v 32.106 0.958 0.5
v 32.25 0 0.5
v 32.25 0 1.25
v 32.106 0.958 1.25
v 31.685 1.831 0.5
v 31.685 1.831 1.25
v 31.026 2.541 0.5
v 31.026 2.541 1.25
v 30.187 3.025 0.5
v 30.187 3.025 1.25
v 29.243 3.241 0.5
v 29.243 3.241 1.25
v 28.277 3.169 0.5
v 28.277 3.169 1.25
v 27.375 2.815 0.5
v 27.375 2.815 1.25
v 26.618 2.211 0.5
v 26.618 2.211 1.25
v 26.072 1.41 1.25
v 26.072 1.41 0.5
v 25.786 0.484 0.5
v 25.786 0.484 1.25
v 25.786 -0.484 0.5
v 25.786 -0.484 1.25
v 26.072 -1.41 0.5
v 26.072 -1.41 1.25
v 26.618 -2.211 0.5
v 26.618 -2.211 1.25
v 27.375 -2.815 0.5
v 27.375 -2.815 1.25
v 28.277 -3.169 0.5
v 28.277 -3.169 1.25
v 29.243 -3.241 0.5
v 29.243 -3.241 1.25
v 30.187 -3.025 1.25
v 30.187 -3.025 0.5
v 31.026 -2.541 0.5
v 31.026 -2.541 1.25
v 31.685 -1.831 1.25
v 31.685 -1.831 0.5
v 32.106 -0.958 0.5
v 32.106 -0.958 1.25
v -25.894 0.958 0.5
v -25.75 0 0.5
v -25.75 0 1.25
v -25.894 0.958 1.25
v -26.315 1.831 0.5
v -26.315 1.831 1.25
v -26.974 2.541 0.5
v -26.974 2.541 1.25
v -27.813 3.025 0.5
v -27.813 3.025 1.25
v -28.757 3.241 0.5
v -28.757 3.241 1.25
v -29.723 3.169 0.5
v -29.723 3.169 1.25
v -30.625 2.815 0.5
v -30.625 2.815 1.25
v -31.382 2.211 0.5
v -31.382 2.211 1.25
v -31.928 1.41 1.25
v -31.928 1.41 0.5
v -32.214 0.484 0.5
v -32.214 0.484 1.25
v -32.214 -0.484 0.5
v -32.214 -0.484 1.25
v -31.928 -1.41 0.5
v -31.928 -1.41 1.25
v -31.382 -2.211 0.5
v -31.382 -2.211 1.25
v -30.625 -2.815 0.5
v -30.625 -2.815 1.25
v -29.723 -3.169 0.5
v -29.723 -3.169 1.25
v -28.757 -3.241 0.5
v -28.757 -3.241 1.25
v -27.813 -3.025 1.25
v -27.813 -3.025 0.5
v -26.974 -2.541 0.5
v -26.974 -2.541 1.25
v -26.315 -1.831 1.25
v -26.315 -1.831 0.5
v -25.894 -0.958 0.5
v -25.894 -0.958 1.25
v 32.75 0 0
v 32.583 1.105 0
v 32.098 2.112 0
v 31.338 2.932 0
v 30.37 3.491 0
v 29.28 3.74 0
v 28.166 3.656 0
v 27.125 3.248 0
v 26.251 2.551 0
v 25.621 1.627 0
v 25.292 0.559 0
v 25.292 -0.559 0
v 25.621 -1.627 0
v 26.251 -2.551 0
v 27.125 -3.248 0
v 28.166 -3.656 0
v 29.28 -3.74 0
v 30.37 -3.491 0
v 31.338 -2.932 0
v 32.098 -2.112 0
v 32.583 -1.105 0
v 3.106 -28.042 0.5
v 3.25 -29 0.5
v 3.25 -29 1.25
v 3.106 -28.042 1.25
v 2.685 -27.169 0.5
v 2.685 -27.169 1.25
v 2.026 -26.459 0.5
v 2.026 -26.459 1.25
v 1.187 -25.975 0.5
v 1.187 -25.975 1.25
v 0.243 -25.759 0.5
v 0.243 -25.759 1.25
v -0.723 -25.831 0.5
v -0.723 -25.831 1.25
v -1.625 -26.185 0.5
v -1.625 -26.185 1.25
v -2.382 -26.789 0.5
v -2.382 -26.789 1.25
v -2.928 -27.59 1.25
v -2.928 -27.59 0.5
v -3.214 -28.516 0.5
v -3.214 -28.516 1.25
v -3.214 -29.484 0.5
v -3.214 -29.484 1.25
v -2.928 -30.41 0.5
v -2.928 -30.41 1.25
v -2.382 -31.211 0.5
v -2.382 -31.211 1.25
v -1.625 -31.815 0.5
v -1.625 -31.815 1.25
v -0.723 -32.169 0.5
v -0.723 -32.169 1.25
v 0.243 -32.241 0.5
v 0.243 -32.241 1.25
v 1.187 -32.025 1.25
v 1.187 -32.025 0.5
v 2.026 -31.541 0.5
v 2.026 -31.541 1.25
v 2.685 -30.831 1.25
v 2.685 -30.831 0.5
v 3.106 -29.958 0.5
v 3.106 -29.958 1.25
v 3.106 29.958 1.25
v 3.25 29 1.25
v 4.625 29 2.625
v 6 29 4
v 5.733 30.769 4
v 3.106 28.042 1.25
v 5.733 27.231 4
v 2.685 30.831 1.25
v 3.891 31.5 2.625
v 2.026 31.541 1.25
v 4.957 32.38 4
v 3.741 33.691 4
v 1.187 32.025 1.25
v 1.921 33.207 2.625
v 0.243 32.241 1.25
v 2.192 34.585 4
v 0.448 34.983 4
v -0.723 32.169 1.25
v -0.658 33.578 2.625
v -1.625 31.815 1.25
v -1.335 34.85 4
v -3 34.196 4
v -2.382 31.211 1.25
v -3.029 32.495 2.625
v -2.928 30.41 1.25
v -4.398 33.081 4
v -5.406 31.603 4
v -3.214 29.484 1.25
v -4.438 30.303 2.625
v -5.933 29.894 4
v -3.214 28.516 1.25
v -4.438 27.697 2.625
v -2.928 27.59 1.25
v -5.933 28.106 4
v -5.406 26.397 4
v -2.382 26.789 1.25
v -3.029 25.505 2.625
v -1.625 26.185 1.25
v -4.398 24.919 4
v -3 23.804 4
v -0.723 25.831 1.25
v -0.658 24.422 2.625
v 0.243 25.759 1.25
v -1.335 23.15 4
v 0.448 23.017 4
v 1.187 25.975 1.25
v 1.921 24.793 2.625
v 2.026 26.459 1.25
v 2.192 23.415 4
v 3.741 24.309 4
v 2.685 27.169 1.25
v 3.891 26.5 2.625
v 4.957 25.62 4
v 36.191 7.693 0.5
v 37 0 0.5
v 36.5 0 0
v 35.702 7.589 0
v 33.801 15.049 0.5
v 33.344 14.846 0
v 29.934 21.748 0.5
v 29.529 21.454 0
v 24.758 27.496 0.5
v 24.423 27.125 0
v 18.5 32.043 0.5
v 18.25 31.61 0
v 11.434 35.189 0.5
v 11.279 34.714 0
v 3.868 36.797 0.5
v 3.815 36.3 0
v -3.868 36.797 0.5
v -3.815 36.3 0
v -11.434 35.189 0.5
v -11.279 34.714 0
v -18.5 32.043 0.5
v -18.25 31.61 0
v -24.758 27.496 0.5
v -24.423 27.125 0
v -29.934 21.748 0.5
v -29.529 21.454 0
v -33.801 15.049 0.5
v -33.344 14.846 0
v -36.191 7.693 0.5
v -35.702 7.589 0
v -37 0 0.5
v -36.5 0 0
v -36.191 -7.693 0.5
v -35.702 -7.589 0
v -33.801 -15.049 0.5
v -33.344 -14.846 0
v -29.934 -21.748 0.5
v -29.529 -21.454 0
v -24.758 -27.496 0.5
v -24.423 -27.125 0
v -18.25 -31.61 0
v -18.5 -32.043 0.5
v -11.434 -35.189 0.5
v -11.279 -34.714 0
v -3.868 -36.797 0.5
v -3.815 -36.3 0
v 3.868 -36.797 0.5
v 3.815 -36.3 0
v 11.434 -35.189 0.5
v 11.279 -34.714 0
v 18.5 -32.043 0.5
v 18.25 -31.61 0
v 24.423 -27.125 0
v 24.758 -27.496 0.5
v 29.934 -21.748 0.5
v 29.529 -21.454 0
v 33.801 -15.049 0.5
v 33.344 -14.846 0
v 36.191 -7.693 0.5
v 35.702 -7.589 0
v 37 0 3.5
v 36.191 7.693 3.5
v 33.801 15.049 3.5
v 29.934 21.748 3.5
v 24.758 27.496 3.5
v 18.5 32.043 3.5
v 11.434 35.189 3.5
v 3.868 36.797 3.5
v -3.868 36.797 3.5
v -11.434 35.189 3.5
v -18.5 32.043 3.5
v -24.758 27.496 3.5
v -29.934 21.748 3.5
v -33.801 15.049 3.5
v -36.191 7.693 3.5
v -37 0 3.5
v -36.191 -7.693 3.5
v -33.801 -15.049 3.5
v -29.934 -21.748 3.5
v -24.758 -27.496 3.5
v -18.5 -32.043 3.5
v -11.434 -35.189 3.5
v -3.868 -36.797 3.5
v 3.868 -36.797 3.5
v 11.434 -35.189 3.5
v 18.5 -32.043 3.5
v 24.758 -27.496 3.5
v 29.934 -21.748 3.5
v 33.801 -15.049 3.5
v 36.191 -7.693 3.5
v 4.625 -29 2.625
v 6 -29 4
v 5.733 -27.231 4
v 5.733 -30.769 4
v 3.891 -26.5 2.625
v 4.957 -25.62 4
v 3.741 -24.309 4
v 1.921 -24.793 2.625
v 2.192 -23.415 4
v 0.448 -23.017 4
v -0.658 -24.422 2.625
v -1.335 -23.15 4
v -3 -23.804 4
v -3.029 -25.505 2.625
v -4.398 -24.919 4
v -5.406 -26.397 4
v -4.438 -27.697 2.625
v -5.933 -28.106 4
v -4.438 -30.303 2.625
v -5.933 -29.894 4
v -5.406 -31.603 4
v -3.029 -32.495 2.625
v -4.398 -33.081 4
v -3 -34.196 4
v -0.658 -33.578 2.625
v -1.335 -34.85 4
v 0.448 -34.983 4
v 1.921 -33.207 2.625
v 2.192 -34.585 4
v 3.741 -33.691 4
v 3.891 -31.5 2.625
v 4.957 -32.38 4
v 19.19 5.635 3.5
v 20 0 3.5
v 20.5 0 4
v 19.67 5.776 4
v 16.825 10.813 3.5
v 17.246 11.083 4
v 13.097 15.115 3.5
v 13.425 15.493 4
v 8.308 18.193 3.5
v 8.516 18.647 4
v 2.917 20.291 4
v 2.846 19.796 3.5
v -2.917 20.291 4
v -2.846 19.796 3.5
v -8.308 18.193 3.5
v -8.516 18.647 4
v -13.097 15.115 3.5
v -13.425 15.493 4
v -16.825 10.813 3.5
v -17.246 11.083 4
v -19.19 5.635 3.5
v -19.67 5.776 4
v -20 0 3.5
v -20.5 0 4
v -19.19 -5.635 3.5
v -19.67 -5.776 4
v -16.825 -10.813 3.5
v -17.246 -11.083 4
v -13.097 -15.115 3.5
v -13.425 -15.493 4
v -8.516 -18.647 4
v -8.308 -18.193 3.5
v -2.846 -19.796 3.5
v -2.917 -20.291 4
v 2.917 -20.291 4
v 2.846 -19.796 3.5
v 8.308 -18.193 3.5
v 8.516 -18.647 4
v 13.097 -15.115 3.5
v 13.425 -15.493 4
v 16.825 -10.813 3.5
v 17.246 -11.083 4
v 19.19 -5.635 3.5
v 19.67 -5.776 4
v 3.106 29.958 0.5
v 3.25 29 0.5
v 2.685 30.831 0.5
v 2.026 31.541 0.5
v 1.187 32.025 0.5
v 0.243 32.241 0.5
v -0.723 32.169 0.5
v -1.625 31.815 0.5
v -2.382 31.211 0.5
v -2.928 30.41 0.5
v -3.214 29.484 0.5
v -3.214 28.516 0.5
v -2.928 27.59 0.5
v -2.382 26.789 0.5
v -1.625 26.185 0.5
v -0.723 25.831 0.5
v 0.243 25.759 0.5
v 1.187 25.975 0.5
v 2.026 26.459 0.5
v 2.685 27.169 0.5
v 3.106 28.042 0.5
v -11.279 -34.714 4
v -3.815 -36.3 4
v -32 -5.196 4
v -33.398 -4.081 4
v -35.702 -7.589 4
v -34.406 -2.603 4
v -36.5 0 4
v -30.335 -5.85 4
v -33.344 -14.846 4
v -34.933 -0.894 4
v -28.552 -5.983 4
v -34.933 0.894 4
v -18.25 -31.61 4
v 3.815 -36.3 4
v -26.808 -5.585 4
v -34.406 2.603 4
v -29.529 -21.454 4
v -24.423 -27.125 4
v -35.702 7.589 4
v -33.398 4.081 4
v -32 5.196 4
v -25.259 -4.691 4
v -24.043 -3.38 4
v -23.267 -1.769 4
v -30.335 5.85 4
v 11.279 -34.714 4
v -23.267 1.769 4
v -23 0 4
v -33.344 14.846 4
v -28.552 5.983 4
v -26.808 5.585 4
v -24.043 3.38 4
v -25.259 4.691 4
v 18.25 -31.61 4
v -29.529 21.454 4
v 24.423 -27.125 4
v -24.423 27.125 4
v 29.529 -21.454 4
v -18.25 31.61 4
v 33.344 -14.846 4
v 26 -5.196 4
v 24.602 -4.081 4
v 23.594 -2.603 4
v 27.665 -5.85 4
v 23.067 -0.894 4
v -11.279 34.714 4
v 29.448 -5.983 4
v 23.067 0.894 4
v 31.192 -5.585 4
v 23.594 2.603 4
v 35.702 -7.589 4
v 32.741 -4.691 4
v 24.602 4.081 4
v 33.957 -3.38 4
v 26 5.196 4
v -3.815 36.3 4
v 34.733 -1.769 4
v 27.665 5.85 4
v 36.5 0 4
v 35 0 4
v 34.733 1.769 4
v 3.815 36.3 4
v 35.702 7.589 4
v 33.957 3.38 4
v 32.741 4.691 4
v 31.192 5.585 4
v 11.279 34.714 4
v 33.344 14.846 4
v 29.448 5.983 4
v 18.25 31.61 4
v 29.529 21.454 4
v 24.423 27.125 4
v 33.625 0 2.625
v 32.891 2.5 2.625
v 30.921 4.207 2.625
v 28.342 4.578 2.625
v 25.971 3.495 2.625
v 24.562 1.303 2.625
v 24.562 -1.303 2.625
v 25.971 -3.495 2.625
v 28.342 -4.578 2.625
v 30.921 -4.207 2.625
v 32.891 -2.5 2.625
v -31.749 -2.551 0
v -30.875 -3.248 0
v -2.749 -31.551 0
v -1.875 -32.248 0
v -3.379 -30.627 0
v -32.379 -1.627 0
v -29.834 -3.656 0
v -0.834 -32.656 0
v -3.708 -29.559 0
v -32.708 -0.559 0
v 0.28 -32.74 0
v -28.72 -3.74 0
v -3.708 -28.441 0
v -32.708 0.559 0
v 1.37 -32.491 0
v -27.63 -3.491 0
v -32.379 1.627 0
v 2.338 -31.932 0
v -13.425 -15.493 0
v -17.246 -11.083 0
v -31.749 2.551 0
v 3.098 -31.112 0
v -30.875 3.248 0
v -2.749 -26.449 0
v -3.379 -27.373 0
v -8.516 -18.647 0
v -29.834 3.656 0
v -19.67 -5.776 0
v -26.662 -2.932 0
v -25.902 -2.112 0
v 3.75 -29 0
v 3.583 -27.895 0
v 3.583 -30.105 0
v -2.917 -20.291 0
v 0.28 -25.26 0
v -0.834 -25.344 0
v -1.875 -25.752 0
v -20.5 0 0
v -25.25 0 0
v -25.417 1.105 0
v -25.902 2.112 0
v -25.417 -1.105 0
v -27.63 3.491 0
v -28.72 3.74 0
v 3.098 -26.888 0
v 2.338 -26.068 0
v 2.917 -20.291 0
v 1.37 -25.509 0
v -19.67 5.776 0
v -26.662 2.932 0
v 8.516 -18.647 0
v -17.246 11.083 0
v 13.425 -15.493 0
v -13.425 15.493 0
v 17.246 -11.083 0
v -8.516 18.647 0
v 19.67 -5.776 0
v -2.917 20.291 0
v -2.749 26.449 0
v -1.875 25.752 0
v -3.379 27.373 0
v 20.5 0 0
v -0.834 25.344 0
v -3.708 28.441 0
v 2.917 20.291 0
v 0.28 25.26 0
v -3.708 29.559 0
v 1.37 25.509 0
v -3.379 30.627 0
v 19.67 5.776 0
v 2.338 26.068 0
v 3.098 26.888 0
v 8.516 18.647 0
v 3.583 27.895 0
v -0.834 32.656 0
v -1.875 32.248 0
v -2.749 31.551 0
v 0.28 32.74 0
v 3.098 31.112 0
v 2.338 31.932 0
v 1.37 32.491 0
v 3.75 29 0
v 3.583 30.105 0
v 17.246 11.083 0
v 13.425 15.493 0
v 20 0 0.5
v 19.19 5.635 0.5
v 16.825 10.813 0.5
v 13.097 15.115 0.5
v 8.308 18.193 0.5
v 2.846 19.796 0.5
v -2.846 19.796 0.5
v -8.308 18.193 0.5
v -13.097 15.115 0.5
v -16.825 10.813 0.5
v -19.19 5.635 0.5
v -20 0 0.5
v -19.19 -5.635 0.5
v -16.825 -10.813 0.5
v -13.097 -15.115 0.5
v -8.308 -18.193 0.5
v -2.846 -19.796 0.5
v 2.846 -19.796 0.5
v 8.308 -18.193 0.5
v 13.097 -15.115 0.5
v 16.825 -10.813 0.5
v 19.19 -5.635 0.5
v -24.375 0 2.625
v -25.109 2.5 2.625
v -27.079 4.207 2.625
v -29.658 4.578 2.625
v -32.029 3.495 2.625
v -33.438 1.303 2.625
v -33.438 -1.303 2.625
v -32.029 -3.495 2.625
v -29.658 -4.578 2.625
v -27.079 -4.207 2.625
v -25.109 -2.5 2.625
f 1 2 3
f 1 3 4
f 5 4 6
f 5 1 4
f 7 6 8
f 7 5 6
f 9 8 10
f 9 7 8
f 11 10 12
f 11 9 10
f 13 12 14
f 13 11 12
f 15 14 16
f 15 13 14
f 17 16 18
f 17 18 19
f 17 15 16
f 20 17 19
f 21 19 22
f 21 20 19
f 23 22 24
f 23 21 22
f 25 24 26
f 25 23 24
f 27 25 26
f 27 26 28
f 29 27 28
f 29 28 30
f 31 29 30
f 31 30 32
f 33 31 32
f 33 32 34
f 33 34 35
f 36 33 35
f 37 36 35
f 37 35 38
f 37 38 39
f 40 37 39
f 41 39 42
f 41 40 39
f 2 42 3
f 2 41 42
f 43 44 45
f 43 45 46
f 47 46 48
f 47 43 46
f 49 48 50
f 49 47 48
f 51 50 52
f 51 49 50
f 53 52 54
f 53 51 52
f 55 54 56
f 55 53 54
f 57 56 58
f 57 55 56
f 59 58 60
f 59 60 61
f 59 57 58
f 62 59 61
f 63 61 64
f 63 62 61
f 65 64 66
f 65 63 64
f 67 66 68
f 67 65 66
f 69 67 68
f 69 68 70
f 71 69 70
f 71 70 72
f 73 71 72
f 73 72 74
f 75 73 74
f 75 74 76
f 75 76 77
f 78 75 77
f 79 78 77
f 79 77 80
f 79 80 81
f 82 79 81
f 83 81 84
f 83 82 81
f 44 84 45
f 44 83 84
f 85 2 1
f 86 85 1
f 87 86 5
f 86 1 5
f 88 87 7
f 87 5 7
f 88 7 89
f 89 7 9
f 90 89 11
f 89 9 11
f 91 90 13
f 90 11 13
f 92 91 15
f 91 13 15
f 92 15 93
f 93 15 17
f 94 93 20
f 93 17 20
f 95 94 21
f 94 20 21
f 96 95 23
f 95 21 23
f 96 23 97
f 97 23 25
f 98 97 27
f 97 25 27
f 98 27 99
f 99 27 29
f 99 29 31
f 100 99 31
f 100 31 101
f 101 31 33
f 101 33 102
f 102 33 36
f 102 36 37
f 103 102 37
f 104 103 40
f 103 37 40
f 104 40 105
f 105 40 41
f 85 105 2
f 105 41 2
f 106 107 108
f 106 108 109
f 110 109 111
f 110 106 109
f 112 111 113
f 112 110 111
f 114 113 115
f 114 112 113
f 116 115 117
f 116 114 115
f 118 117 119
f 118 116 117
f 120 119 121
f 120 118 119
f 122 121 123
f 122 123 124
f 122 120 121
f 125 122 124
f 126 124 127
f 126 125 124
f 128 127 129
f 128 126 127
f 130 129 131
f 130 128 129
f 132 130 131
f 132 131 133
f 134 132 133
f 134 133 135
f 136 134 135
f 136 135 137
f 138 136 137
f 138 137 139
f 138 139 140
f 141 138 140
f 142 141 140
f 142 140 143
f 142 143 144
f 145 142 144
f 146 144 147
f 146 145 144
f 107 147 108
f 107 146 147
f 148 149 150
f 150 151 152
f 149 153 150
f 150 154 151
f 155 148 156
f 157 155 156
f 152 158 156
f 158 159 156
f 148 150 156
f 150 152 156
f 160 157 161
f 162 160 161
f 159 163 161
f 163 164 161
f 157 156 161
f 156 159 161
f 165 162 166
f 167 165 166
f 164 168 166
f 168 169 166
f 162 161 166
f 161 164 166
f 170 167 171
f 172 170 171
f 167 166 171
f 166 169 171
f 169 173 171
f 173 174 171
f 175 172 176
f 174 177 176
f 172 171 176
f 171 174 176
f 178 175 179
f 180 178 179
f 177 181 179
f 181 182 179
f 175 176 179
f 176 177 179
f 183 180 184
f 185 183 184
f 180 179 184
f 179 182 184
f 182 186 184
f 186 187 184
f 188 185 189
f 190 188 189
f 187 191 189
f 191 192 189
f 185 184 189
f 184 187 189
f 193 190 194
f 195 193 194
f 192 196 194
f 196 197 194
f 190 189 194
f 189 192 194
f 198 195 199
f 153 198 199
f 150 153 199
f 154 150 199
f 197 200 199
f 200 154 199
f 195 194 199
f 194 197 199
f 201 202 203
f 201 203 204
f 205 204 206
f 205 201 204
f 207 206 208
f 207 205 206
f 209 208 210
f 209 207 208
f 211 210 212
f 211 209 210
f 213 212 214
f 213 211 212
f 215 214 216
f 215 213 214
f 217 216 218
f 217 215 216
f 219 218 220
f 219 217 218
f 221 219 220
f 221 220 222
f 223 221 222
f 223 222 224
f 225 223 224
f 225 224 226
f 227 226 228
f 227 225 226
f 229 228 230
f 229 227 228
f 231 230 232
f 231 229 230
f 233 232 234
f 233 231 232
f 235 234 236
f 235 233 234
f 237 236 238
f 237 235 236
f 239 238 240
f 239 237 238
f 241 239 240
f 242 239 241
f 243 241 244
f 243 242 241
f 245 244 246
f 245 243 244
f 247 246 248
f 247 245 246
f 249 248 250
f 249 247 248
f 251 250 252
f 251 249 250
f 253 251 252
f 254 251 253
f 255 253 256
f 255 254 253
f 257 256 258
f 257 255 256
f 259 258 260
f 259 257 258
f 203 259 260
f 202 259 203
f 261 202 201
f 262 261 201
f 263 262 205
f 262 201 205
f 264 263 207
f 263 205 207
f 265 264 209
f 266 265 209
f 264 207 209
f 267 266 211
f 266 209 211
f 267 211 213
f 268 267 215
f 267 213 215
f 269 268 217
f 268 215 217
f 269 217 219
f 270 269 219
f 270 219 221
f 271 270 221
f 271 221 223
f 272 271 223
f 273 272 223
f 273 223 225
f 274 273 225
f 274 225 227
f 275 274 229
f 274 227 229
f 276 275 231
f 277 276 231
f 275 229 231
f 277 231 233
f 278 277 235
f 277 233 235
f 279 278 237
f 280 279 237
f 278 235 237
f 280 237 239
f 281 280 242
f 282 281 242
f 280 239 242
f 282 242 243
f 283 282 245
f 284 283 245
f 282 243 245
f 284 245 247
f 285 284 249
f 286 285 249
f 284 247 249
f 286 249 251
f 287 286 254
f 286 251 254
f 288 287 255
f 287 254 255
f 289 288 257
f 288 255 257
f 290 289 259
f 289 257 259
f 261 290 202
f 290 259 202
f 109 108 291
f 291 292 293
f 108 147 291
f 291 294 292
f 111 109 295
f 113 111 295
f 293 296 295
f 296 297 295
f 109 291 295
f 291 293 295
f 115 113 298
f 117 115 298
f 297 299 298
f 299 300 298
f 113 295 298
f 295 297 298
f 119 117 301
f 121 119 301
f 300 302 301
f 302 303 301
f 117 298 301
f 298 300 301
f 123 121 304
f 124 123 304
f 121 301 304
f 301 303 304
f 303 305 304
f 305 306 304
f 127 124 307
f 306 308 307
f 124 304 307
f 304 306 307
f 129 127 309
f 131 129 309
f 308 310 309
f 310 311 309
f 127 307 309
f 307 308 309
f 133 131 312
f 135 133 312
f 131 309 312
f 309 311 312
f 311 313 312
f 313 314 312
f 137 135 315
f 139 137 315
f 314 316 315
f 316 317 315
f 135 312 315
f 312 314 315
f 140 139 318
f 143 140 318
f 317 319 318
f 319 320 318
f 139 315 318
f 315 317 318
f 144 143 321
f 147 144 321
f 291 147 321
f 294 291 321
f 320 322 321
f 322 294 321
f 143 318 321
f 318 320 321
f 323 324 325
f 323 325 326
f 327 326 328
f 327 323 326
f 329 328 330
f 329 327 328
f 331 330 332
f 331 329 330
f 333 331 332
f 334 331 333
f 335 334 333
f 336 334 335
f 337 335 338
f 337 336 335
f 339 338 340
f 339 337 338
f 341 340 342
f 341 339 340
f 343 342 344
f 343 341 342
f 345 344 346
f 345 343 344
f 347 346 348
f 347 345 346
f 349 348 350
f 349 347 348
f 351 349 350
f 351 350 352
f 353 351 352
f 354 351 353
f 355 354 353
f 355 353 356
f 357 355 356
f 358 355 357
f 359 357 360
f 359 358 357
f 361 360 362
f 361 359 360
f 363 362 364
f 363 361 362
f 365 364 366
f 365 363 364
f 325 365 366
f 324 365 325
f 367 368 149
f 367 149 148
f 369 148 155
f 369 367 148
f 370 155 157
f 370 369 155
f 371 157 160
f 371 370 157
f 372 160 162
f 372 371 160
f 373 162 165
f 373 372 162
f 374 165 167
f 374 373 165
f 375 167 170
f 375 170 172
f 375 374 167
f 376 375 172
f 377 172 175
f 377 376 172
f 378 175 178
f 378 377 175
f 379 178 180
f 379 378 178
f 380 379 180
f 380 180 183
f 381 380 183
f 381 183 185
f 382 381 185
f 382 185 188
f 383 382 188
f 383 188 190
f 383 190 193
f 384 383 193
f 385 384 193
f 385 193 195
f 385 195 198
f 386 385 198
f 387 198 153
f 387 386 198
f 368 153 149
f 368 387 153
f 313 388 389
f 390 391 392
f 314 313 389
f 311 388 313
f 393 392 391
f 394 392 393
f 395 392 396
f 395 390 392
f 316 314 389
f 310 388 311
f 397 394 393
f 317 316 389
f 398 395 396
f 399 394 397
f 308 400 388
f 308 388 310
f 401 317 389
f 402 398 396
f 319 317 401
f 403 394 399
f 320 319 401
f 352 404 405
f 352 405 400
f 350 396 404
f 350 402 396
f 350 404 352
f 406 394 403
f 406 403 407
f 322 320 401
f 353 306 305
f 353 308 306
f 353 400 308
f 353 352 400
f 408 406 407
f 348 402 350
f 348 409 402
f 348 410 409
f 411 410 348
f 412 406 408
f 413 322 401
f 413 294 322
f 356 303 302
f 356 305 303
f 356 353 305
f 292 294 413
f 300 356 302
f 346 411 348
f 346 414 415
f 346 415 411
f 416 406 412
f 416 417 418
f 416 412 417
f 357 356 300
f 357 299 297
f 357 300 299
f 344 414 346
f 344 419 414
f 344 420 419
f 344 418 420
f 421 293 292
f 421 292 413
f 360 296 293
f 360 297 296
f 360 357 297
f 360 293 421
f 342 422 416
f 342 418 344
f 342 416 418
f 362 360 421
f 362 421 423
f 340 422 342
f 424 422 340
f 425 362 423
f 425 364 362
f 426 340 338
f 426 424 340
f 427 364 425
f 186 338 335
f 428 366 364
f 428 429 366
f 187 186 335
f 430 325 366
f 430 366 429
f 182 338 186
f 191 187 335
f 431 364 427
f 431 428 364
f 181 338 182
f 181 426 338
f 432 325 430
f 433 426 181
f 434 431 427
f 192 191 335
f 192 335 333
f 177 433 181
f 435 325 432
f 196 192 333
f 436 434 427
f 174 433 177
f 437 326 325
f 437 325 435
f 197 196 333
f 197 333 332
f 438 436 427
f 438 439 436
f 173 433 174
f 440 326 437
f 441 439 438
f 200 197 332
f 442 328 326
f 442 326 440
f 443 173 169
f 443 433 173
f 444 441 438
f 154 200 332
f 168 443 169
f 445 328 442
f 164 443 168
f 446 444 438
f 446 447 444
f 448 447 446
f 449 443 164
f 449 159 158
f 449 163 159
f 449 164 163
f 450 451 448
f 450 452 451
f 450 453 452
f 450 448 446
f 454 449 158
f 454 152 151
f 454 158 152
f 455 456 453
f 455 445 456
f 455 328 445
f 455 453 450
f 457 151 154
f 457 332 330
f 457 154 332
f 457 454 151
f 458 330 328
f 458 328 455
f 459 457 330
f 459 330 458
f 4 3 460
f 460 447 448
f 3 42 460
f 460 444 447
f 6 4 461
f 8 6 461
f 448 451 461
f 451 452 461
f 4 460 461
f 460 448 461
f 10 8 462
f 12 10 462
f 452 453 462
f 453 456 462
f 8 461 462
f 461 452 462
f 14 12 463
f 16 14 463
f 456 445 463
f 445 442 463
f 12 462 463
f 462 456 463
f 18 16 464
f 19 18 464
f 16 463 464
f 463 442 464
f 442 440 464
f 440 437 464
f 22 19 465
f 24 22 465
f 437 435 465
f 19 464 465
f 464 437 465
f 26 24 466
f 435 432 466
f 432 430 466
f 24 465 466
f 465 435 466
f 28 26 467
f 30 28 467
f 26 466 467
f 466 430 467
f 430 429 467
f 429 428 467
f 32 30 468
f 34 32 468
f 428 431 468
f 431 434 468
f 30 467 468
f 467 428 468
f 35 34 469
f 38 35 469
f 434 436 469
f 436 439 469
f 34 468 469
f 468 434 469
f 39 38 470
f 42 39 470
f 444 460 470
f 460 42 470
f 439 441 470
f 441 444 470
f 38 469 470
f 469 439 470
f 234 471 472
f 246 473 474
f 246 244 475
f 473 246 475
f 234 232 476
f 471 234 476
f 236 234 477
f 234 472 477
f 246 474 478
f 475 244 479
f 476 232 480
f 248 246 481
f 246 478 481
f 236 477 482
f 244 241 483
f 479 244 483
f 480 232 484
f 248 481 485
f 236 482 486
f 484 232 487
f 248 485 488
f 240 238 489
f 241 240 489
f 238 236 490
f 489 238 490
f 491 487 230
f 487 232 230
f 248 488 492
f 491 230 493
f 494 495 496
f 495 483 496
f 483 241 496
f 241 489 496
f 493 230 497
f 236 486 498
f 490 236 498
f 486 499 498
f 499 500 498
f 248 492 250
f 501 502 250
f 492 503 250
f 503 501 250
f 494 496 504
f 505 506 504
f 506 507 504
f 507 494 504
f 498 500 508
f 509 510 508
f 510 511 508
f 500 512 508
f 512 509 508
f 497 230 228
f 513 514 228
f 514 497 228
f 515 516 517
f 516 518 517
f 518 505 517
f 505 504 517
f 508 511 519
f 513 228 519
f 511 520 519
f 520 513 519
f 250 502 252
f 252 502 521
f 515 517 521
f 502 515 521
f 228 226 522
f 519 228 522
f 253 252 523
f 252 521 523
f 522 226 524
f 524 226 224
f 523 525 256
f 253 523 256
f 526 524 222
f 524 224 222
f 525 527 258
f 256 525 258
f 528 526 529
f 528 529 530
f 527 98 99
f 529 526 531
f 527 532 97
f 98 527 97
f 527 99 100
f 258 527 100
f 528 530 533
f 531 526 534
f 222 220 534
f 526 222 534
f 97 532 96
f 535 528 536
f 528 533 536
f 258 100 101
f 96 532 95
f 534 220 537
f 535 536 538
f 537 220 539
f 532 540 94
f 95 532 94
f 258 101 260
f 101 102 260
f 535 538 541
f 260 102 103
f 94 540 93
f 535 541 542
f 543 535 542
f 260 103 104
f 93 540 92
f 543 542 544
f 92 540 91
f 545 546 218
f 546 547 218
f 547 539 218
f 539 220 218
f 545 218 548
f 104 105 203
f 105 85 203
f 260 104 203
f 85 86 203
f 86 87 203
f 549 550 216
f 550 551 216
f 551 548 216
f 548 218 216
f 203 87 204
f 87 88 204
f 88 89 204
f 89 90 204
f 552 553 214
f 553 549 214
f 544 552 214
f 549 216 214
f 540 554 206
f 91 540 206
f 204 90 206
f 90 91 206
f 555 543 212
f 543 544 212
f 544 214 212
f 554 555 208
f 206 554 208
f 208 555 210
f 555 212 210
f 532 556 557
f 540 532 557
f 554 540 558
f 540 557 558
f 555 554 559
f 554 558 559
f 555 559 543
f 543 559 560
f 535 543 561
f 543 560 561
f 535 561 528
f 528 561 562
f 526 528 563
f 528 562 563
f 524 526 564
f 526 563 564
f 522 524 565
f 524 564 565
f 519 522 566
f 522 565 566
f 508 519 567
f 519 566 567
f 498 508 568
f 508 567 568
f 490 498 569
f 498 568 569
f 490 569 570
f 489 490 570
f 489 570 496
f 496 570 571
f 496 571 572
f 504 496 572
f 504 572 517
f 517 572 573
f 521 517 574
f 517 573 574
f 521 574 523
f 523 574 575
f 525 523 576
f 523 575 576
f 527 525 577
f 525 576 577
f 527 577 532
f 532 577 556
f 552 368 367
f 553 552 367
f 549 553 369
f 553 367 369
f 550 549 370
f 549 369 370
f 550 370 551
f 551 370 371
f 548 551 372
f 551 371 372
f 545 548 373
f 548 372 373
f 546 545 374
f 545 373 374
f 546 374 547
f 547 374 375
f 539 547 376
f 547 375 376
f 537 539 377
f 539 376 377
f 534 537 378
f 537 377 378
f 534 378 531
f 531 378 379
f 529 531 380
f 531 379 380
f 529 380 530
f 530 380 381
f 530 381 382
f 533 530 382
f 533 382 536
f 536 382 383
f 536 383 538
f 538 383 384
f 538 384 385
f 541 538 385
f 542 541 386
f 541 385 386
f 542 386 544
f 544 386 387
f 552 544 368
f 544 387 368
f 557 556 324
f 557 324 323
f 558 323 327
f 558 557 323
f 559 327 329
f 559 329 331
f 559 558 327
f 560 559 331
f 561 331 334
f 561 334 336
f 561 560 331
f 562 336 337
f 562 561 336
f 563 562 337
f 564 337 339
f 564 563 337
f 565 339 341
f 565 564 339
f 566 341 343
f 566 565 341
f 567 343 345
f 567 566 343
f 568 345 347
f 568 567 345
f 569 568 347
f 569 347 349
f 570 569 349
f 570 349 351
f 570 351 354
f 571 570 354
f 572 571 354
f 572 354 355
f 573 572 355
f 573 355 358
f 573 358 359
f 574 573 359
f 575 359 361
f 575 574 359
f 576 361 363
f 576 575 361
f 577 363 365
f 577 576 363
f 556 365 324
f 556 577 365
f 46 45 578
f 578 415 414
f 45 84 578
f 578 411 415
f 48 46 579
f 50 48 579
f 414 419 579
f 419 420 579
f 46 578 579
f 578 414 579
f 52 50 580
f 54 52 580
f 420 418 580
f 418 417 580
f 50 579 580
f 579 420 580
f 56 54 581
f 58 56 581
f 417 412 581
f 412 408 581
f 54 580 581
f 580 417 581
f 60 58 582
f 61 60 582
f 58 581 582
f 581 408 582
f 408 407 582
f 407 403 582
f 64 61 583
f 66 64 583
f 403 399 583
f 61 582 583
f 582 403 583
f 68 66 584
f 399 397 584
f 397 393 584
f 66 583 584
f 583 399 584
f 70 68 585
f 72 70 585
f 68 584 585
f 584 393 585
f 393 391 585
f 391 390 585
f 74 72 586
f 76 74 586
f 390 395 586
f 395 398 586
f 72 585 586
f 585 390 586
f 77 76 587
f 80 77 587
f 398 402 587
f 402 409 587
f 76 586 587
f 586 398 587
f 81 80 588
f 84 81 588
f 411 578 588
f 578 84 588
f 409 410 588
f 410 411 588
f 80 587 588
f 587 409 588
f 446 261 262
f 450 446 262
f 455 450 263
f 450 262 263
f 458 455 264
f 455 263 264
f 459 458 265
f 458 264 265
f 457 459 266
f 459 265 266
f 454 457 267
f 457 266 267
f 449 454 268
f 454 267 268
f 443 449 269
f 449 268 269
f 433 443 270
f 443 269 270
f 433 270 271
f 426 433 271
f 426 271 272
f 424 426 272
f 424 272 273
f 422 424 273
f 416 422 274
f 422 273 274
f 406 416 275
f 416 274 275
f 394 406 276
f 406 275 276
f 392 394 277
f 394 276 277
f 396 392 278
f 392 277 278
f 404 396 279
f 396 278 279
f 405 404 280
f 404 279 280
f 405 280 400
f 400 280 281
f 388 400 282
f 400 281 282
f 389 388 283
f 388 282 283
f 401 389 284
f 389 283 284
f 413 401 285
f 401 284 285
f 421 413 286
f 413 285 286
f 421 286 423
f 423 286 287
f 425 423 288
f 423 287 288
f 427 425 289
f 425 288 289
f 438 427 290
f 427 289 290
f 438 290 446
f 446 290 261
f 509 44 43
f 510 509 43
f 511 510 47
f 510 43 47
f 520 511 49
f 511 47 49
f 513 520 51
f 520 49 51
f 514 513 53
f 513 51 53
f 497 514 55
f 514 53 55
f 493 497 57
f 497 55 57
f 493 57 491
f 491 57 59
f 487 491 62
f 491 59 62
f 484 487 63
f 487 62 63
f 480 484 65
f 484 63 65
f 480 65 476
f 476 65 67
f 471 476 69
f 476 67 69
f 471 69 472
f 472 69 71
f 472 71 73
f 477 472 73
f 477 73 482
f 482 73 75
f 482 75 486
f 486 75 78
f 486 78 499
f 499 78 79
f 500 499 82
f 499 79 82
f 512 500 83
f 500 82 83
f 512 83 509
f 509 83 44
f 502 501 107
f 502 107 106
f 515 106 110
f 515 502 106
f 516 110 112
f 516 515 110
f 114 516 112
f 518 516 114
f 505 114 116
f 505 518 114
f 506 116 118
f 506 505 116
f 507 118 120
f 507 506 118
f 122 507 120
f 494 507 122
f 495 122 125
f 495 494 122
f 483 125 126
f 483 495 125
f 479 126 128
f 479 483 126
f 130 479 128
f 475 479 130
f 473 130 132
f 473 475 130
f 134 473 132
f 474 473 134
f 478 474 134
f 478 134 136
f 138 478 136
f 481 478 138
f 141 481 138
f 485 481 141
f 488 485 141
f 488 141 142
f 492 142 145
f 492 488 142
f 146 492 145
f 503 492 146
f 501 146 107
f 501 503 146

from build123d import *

# Parameters (mm, degrees)
F0_R     = 37
F0_R_2   = 3.25
F0_R_3   = 20
F1_DEPTH = 4
F2_SIZE  = 2.75
F3_SIZE  = 0.5


with BuildPart() as f1:
    # F0 (on Top) → F1 (new body)
    with BuildSketch(Plane.XY):
        Circle(F0_R)
        with Locations((0, -29)):
            Circle(F0_R_2, mode=Mode.SUBTRACT)
        with Locations((-29, 0)):
            Circle(F0_R_2, mode=Mode.SUBTRACT)
        Circle(F0_R_3, mode=Mode.SUBTRACT)
        with Locations((29, 0)):
            Circle(F0_R_2, mode=Mode.SUBTRACT)
        with Locations((0, 29)):
            Circle(F0_R_2, mode=Mode.SUBTRACT)
    extrude(amount=F1_DEPTH)

    # F2
    f2_edges = [f1.edges().sort_by_distance(p)[0] for p in [
        (-3.25, -29, 4),
        (-32.25, 0, 4),
        (-3.25, 29, 4),
        (25.75, 0, 4),
    ]]
    chamfer(f2_edges, length=F2_SIZE)

    # F3
    f3_edges = [f1.edges().sort_by_distance(p)[0] for p in [
        (20, 0, 2),
        (-20, 0, 0),
        (-20, 0, 4),
        (37, 0, 2),
        (-37, 0, 0),
        (-37, 0, 4),
        (-3.25, -29, 0),
        (-32.25, 0, 0),
        (25.75, 0, 0),
        (-3.25, 29, 0),
    ]]
    chamfer(f3_edges, length=F3_SIZE)


solid = f1.part
